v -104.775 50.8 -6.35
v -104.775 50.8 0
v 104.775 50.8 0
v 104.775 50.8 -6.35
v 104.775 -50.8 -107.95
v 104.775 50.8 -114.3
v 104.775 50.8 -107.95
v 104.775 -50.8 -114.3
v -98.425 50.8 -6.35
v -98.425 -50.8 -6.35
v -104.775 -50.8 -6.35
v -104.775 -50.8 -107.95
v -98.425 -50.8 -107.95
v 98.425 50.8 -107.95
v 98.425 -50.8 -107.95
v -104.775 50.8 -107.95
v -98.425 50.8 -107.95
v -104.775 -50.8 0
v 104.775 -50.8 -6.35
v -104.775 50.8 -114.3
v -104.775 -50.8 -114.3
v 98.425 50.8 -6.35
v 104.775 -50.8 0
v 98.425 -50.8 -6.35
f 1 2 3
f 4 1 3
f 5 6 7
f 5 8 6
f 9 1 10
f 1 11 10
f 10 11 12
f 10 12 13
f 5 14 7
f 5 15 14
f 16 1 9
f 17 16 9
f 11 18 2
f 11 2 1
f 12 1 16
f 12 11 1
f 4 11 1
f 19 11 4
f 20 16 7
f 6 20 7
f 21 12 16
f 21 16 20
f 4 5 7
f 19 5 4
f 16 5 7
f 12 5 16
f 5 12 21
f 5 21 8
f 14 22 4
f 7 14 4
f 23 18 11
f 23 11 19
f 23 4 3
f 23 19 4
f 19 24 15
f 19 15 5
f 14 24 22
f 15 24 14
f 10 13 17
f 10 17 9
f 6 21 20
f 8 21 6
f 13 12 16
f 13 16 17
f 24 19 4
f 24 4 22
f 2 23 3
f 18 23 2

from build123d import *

# Parameters (mm, degrees)
F2_DEPTH      = 50.8
F1_W          = 6.35
F1_H          = 50.8
F3_DEPTH      = 50.8
F3_DEPTH_BACK = 50.8


# Not quite as in the source:
# - a variable given as a bare number and used for a length is read in inches; the dataset says mm whatever the document's units were


with BuildPart() as f2:
    # F1 (on Front) → F2 (new body, symmetric)
    with BuildSketch(Plane.XZ):
        Polygon((104.775, 0), (-104.775, 0), (-104.775, -6.35), (-98.425, -6.35), (98.425, -6.35), (104.775, -6.35), align=None)
    extrude(amount=F2_DEPTH, both=True)


with BuildPart() as f2b:
    # F1 (on Front) → F2, piece 2 (new body, symmetric)
    with BuildSketch(Plane.XZ):
        Polygon((104.775, -114.3), (104.775, -107.95), (98.425, -107.95), (-98.425, -107.95), (-104.775, -107.95), (-104.775, -114.3), align=None)
    extrude(amount=F2_DEPTH, both=True)


with BuildPart() as f3:
    # F1 (on Front) → F3 (new body, two sides)
    with BuildSketch(Plane.XZ) as f3_sk:
        with Locations((-101.6, -31.75)):
            Rectangle(F1_W, F1_H)
        with Locations((-101.6, -82.55)):
            Rectangle(F1_W, F1_H)
    extrude(amount=F3_DEPTH)
    extrude(f3_sk.sketch, amount=-F3_DEPTH_BACK)


with BuildPart() as f3b:
    # F1 (on Front) → F3, piece 2 (new body, two sides)
    with BuildSketch(Plane.XZ) as f3_2_sk:
        Polygon((104.775, -107.95), (104.775, -6.35), (98.425, -6.35), (98.425, -57.15), (98.425, -107.95), align=None)
    extrude(amount=F3_DEPTH)
    extrude(f3_2_sk.sketch, amount=-F3_DEPTH_BACK)


solid = Compound([f2.part, f2b.part, f3.part, f3b.part])
